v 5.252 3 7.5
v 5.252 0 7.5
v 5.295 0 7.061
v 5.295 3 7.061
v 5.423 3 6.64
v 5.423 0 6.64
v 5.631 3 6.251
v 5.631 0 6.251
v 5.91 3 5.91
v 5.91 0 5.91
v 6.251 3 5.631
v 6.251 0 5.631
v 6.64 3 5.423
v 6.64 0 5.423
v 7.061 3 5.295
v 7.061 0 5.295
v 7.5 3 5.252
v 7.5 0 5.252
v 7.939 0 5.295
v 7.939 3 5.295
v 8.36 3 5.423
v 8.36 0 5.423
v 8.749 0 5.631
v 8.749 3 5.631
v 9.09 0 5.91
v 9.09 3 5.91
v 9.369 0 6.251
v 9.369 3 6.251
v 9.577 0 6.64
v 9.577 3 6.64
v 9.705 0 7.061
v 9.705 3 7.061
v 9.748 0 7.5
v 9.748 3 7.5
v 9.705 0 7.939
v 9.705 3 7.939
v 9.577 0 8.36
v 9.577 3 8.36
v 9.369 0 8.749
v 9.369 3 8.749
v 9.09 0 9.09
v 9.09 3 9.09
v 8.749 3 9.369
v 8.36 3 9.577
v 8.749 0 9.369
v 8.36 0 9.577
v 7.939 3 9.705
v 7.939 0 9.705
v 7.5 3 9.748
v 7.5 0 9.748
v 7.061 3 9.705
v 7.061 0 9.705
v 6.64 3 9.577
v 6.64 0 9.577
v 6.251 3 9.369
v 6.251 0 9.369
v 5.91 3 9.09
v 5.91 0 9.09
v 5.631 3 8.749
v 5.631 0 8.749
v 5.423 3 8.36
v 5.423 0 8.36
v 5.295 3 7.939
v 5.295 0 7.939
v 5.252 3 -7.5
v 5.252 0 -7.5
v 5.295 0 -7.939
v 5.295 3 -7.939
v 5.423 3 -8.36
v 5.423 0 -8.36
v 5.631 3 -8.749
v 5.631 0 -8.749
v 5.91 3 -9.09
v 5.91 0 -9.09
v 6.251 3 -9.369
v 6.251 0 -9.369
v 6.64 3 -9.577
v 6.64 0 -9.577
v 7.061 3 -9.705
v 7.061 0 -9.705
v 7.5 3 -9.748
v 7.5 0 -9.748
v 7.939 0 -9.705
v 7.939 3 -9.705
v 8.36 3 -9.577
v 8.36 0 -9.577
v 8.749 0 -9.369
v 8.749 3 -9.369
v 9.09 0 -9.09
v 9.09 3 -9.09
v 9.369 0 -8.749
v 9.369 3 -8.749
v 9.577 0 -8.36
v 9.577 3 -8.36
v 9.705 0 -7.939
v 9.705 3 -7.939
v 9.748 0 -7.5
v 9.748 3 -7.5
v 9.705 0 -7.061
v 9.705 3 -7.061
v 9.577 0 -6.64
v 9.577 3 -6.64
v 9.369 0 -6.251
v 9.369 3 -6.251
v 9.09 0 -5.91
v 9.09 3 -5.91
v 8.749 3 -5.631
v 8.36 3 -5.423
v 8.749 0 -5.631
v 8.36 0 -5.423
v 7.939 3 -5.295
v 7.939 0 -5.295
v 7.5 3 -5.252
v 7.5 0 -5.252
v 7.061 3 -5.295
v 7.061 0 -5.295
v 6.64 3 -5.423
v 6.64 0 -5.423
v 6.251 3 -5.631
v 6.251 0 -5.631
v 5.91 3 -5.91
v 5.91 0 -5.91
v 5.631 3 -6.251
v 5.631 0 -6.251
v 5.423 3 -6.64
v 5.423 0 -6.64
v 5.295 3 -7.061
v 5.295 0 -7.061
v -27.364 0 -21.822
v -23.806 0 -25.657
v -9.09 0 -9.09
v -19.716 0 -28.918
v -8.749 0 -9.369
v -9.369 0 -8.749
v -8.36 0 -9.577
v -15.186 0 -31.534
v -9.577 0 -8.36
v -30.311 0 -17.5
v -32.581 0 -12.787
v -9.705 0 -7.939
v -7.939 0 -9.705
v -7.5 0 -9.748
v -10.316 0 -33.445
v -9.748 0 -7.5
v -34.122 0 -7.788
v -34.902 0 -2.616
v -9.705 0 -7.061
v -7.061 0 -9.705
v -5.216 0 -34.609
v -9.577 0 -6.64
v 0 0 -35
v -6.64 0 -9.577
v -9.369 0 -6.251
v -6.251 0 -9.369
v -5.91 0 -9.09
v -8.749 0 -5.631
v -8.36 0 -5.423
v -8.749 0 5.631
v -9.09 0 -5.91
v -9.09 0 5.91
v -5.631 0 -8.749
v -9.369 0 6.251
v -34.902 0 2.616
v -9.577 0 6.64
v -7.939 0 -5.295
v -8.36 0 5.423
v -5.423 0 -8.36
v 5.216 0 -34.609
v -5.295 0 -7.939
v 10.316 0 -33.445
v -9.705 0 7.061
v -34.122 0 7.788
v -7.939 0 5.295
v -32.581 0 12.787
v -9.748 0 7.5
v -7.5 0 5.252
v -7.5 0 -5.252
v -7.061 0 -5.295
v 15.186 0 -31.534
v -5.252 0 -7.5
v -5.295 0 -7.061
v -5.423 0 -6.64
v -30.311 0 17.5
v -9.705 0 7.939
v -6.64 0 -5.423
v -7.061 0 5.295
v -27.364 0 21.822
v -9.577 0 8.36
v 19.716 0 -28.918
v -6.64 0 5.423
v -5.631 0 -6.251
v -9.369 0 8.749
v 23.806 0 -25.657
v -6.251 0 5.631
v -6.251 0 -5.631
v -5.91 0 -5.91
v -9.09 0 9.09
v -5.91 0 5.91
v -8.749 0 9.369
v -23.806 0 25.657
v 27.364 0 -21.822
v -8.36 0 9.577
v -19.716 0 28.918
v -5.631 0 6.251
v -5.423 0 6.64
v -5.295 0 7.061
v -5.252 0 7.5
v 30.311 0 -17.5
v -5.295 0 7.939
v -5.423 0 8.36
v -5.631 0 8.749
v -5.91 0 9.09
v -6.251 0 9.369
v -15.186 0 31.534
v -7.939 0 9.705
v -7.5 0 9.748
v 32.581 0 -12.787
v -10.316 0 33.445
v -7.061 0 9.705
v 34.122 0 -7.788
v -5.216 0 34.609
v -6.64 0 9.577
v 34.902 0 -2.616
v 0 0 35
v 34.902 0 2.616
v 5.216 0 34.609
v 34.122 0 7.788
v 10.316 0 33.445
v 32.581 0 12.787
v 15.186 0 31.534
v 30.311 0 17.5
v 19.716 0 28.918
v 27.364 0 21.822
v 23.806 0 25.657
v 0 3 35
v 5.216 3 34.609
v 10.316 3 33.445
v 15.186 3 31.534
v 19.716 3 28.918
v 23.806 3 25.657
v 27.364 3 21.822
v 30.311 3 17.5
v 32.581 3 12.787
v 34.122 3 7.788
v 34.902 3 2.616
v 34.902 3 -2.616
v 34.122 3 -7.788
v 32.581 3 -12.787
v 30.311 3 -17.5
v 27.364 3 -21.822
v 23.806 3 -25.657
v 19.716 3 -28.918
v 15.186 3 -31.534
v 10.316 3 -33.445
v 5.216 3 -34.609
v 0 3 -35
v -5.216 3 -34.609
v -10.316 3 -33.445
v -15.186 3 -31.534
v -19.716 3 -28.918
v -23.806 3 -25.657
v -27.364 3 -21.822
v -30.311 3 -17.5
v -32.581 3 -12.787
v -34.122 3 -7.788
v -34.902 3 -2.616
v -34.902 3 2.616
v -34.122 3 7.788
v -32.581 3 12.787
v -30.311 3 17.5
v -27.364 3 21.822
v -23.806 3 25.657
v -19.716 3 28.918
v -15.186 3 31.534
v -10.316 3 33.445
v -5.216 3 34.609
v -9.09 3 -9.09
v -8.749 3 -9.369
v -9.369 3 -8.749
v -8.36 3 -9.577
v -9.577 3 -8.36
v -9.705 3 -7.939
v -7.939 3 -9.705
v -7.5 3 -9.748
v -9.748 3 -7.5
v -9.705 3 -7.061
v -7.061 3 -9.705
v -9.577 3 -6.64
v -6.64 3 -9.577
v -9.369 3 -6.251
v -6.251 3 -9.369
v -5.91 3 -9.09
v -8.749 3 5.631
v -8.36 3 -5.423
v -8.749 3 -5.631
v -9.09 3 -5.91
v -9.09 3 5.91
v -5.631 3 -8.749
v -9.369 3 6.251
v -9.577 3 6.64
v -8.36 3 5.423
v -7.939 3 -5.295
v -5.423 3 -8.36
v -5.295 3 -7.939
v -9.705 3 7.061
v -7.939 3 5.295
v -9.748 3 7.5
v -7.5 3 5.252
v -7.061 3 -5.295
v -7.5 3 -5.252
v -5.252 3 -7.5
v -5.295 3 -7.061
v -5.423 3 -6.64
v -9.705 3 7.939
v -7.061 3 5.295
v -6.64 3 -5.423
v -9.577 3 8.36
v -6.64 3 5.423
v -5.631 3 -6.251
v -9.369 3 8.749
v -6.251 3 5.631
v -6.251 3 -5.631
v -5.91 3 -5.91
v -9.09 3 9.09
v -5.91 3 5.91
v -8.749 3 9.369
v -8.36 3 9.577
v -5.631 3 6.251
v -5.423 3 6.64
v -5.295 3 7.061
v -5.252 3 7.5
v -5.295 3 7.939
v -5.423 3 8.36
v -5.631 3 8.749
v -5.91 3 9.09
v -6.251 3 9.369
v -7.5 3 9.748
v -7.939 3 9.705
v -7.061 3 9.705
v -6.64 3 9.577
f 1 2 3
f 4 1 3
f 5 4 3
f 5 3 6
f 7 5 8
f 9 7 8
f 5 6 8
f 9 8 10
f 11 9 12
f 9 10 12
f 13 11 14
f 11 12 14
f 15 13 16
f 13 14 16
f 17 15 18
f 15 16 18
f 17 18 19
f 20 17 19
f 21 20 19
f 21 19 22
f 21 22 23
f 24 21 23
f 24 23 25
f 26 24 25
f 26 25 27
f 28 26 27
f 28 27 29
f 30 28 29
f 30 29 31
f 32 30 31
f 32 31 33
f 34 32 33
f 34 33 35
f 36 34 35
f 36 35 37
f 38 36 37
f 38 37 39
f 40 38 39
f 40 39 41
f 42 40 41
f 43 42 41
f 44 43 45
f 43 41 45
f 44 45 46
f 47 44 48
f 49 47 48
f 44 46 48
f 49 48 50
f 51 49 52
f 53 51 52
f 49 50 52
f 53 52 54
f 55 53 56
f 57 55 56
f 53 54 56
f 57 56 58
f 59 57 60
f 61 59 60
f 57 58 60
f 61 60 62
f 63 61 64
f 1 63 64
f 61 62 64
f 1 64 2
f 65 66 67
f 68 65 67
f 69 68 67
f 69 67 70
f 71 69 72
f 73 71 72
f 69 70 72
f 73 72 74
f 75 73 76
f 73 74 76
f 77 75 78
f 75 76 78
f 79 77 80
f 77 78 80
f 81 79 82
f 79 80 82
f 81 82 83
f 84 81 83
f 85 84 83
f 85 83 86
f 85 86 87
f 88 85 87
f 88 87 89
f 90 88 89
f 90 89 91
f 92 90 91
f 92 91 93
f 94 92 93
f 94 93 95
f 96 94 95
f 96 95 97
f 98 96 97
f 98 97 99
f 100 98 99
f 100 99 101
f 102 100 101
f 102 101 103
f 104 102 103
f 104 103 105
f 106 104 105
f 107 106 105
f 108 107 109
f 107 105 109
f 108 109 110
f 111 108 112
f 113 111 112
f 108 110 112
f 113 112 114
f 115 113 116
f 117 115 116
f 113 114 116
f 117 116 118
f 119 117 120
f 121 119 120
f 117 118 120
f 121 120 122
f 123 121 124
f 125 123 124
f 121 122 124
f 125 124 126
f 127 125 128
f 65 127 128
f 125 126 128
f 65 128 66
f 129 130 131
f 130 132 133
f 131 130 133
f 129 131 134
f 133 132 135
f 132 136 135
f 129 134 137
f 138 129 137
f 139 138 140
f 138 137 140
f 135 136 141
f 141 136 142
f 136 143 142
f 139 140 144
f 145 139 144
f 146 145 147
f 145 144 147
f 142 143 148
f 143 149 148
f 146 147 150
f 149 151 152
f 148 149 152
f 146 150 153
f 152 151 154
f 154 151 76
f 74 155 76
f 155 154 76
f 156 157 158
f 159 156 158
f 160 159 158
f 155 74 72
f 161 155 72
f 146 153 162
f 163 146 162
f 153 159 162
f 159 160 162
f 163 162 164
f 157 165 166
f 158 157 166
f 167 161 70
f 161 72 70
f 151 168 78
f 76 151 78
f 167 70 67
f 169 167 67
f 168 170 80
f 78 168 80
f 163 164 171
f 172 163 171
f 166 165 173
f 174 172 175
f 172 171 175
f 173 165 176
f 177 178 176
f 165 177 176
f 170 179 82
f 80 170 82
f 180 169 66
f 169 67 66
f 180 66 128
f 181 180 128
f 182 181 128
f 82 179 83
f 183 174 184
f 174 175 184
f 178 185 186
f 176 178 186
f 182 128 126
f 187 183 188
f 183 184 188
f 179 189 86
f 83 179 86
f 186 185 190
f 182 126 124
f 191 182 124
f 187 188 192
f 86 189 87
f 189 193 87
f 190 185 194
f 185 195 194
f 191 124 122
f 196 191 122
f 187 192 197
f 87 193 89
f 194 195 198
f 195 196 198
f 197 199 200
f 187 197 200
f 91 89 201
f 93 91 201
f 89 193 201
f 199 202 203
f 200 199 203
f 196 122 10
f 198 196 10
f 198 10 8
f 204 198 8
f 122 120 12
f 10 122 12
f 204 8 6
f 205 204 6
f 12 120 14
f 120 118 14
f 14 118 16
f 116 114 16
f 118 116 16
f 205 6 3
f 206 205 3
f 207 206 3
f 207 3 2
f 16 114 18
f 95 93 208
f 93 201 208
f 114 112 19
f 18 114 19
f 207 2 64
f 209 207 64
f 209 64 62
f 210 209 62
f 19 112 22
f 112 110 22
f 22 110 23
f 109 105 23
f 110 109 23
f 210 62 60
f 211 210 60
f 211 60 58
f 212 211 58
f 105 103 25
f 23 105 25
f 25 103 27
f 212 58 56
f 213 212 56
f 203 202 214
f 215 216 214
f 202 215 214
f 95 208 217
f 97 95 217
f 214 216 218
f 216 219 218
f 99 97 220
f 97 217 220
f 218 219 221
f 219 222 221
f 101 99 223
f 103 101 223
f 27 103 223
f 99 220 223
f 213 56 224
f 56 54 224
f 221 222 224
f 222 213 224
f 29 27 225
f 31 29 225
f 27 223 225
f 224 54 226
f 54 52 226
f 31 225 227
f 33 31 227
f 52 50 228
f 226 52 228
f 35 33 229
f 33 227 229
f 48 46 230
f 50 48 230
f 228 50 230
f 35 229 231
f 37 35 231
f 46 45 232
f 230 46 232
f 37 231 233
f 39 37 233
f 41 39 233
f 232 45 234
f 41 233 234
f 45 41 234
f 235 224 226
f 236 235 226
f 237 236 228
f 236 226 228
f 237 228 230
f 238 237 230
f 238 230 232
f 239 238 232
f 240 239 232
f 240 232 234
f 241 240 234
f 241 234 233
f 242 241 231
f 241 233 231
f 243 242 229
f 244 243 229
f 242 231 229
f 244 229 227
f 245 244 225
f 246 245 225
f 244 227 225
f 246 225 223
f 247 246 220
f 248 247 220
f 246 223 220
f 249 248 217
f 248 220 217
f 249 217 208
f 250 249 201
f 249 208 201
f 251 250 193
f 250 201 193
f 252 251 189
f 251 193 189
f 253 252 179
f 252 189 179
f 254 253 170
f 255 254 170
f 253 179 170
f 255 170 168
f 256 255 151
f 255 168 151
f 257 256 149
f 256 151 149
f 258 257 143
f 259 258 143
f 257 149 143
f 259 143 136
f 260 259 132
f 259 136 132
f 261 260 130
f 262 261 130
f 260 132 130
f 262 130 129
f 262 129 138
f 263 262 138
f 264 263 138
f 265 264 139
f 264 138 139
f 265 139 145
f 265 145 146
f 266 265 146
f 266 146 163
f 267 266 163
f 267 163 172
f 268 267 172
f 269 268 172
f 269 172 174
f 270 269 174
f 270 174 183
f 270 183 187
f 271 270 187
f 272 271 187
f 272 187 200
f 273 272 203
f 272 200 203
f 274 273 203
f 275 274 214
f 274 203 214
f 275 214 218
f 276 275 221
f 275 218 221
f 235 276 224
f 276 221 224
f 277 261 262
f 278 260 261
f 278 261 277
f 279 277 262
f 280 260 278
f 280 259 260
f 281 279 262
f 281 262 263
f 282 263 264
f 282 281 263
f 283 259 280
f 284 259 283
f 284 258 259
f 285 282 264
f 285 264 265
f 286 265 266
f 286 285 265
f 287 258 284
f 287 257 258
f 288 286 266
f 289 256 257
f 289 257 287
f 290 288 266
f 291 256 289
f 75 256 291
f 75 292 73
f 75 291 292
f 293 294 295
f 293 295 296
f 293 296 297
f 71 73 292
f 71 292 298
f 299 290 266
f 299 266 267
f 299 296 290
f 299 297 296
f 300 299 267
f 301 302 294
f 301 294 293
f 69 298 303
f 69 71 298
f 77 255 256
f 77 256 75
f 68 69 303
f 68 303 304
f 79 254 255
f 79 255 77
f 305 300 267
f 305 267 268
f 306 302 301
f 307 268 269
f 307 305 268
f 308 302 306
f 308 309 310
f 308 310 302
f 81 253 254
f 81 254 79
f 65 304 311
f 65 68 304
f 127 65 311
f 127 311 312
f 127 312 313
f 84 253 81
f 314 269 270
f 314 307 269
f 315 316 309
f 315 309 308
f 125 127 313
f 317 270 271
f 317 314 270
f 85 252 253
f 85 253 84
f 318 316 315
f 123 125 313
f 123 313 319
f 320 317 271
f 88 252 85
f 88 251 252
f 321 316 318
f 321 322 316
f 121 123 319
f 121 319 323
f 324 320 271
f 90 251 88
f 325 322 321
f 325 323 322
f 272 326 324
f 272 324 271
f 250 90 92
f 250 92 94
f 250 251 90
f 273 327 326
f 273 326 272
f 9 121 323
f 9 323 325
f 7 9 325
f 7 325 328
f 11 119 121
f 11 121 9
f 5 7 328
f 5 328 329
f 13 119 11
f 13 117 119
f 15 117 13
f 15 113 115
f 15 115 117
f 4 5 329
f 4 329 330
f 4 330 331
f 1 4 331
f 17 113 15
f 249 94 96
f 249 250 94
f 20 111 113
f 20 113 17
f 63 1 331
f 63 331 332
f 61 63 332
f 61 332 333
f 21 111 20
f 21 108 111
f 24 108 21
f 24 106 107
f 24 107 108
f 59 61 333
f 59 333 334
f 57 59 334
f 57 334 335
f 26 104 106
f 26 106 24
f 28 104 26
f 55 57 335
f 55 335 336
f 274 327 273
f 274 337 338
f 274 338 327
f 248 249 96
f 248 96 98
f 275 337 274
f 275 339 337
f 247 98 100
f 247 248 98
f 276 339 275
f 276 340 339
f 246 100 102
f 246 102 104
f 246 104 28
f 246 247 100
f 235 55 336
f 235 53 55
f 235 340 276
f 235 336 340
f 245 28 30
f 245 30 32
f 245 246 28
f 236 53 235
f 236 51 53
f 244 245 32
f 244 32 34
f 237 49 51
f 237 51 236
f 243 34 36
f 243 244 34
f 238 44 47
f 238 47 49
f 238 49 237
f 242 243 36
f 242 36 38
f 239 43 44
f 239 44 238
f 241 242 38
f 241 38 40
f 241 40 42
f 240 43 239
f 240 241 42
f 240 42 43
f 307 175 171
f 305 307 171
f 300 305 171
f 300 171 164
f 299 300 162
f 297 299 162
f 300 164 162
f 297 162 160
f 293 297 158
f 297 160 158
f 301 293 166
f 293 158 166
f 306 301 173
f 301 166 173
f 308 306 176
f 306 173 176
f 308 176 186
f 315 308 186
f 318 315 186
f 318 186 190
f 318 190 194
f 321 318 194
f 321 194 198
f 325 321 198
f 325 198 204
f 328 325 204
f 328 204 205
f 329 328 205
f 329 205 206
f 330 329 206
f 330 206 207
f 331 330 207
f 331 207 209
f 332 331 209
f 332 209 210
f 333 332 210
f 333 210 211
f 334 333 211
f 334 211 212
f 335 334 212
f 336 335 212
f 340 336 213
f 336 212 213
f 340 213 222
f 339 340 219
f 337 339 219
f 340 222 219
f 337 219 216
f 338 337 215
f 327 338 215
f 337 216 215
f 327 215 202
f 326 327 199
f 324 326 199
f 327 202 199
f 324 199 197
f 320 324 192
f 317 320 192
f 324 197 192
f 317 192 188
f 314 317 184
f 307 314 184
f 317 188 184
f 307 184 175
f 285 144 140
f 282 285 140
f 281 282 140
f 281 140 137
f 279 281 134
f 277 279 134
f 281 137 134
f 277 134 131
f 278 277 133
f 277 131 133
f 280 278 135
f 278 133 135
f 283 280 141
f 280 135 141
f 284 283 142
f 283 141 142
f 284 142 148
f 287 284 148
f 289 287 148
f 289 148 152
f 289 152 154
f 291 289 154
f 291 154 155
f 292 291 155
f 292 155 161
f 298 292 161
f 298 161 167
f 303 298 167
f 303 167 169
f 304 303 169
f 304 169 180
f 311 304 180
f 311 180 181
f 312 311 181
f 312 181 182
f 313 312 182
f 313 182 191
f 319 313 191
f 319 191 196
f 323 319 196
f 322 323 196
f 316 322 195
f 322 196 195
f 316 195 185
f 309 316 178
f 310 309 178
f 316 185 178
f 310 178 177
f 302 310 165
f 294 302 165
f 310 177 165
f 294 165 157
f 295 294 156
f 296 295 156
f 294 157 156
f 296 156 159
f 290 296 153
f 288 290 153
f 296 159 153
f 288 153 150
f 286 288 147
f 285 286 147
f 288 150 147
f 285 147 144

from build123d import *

# Parameters (mm, degrees)
SKETCH1_R             = 35
BOSS_EXTRUDE1_DEPTH   = 3
F_8_CLEARANCE_HOLE1_D = 4.4958


with BuildPart() as part:
    # Sketch1 → Boss-Extrude1 (new body)
    with BuildSketch(Plane(origin=(0, 0, 0), x_dir=(1, 0, 0), z_dir=(0, 1, 0))):
        with Locations(Location((0, 0, 0), (0, 0, 270))):
            Circle(SKETCH1_R)
    extrude(amount=BOSS_EXTRUDE1_DEPTH)

    # #8 Clearance Hole1 (through all)
    with Locations(Plane(origin=(0, 3, 0), x_dir=(1, 0, 0), z_dir=(0, 1, 0))):
        with Locations((-7.5, 7.5), (7.5, 7.5), (-7.5, -7.5), (7.5, -7.5)):
            Hole(F_8_CLEARANCE_HOLE1_D / 2)


solid = part.part
